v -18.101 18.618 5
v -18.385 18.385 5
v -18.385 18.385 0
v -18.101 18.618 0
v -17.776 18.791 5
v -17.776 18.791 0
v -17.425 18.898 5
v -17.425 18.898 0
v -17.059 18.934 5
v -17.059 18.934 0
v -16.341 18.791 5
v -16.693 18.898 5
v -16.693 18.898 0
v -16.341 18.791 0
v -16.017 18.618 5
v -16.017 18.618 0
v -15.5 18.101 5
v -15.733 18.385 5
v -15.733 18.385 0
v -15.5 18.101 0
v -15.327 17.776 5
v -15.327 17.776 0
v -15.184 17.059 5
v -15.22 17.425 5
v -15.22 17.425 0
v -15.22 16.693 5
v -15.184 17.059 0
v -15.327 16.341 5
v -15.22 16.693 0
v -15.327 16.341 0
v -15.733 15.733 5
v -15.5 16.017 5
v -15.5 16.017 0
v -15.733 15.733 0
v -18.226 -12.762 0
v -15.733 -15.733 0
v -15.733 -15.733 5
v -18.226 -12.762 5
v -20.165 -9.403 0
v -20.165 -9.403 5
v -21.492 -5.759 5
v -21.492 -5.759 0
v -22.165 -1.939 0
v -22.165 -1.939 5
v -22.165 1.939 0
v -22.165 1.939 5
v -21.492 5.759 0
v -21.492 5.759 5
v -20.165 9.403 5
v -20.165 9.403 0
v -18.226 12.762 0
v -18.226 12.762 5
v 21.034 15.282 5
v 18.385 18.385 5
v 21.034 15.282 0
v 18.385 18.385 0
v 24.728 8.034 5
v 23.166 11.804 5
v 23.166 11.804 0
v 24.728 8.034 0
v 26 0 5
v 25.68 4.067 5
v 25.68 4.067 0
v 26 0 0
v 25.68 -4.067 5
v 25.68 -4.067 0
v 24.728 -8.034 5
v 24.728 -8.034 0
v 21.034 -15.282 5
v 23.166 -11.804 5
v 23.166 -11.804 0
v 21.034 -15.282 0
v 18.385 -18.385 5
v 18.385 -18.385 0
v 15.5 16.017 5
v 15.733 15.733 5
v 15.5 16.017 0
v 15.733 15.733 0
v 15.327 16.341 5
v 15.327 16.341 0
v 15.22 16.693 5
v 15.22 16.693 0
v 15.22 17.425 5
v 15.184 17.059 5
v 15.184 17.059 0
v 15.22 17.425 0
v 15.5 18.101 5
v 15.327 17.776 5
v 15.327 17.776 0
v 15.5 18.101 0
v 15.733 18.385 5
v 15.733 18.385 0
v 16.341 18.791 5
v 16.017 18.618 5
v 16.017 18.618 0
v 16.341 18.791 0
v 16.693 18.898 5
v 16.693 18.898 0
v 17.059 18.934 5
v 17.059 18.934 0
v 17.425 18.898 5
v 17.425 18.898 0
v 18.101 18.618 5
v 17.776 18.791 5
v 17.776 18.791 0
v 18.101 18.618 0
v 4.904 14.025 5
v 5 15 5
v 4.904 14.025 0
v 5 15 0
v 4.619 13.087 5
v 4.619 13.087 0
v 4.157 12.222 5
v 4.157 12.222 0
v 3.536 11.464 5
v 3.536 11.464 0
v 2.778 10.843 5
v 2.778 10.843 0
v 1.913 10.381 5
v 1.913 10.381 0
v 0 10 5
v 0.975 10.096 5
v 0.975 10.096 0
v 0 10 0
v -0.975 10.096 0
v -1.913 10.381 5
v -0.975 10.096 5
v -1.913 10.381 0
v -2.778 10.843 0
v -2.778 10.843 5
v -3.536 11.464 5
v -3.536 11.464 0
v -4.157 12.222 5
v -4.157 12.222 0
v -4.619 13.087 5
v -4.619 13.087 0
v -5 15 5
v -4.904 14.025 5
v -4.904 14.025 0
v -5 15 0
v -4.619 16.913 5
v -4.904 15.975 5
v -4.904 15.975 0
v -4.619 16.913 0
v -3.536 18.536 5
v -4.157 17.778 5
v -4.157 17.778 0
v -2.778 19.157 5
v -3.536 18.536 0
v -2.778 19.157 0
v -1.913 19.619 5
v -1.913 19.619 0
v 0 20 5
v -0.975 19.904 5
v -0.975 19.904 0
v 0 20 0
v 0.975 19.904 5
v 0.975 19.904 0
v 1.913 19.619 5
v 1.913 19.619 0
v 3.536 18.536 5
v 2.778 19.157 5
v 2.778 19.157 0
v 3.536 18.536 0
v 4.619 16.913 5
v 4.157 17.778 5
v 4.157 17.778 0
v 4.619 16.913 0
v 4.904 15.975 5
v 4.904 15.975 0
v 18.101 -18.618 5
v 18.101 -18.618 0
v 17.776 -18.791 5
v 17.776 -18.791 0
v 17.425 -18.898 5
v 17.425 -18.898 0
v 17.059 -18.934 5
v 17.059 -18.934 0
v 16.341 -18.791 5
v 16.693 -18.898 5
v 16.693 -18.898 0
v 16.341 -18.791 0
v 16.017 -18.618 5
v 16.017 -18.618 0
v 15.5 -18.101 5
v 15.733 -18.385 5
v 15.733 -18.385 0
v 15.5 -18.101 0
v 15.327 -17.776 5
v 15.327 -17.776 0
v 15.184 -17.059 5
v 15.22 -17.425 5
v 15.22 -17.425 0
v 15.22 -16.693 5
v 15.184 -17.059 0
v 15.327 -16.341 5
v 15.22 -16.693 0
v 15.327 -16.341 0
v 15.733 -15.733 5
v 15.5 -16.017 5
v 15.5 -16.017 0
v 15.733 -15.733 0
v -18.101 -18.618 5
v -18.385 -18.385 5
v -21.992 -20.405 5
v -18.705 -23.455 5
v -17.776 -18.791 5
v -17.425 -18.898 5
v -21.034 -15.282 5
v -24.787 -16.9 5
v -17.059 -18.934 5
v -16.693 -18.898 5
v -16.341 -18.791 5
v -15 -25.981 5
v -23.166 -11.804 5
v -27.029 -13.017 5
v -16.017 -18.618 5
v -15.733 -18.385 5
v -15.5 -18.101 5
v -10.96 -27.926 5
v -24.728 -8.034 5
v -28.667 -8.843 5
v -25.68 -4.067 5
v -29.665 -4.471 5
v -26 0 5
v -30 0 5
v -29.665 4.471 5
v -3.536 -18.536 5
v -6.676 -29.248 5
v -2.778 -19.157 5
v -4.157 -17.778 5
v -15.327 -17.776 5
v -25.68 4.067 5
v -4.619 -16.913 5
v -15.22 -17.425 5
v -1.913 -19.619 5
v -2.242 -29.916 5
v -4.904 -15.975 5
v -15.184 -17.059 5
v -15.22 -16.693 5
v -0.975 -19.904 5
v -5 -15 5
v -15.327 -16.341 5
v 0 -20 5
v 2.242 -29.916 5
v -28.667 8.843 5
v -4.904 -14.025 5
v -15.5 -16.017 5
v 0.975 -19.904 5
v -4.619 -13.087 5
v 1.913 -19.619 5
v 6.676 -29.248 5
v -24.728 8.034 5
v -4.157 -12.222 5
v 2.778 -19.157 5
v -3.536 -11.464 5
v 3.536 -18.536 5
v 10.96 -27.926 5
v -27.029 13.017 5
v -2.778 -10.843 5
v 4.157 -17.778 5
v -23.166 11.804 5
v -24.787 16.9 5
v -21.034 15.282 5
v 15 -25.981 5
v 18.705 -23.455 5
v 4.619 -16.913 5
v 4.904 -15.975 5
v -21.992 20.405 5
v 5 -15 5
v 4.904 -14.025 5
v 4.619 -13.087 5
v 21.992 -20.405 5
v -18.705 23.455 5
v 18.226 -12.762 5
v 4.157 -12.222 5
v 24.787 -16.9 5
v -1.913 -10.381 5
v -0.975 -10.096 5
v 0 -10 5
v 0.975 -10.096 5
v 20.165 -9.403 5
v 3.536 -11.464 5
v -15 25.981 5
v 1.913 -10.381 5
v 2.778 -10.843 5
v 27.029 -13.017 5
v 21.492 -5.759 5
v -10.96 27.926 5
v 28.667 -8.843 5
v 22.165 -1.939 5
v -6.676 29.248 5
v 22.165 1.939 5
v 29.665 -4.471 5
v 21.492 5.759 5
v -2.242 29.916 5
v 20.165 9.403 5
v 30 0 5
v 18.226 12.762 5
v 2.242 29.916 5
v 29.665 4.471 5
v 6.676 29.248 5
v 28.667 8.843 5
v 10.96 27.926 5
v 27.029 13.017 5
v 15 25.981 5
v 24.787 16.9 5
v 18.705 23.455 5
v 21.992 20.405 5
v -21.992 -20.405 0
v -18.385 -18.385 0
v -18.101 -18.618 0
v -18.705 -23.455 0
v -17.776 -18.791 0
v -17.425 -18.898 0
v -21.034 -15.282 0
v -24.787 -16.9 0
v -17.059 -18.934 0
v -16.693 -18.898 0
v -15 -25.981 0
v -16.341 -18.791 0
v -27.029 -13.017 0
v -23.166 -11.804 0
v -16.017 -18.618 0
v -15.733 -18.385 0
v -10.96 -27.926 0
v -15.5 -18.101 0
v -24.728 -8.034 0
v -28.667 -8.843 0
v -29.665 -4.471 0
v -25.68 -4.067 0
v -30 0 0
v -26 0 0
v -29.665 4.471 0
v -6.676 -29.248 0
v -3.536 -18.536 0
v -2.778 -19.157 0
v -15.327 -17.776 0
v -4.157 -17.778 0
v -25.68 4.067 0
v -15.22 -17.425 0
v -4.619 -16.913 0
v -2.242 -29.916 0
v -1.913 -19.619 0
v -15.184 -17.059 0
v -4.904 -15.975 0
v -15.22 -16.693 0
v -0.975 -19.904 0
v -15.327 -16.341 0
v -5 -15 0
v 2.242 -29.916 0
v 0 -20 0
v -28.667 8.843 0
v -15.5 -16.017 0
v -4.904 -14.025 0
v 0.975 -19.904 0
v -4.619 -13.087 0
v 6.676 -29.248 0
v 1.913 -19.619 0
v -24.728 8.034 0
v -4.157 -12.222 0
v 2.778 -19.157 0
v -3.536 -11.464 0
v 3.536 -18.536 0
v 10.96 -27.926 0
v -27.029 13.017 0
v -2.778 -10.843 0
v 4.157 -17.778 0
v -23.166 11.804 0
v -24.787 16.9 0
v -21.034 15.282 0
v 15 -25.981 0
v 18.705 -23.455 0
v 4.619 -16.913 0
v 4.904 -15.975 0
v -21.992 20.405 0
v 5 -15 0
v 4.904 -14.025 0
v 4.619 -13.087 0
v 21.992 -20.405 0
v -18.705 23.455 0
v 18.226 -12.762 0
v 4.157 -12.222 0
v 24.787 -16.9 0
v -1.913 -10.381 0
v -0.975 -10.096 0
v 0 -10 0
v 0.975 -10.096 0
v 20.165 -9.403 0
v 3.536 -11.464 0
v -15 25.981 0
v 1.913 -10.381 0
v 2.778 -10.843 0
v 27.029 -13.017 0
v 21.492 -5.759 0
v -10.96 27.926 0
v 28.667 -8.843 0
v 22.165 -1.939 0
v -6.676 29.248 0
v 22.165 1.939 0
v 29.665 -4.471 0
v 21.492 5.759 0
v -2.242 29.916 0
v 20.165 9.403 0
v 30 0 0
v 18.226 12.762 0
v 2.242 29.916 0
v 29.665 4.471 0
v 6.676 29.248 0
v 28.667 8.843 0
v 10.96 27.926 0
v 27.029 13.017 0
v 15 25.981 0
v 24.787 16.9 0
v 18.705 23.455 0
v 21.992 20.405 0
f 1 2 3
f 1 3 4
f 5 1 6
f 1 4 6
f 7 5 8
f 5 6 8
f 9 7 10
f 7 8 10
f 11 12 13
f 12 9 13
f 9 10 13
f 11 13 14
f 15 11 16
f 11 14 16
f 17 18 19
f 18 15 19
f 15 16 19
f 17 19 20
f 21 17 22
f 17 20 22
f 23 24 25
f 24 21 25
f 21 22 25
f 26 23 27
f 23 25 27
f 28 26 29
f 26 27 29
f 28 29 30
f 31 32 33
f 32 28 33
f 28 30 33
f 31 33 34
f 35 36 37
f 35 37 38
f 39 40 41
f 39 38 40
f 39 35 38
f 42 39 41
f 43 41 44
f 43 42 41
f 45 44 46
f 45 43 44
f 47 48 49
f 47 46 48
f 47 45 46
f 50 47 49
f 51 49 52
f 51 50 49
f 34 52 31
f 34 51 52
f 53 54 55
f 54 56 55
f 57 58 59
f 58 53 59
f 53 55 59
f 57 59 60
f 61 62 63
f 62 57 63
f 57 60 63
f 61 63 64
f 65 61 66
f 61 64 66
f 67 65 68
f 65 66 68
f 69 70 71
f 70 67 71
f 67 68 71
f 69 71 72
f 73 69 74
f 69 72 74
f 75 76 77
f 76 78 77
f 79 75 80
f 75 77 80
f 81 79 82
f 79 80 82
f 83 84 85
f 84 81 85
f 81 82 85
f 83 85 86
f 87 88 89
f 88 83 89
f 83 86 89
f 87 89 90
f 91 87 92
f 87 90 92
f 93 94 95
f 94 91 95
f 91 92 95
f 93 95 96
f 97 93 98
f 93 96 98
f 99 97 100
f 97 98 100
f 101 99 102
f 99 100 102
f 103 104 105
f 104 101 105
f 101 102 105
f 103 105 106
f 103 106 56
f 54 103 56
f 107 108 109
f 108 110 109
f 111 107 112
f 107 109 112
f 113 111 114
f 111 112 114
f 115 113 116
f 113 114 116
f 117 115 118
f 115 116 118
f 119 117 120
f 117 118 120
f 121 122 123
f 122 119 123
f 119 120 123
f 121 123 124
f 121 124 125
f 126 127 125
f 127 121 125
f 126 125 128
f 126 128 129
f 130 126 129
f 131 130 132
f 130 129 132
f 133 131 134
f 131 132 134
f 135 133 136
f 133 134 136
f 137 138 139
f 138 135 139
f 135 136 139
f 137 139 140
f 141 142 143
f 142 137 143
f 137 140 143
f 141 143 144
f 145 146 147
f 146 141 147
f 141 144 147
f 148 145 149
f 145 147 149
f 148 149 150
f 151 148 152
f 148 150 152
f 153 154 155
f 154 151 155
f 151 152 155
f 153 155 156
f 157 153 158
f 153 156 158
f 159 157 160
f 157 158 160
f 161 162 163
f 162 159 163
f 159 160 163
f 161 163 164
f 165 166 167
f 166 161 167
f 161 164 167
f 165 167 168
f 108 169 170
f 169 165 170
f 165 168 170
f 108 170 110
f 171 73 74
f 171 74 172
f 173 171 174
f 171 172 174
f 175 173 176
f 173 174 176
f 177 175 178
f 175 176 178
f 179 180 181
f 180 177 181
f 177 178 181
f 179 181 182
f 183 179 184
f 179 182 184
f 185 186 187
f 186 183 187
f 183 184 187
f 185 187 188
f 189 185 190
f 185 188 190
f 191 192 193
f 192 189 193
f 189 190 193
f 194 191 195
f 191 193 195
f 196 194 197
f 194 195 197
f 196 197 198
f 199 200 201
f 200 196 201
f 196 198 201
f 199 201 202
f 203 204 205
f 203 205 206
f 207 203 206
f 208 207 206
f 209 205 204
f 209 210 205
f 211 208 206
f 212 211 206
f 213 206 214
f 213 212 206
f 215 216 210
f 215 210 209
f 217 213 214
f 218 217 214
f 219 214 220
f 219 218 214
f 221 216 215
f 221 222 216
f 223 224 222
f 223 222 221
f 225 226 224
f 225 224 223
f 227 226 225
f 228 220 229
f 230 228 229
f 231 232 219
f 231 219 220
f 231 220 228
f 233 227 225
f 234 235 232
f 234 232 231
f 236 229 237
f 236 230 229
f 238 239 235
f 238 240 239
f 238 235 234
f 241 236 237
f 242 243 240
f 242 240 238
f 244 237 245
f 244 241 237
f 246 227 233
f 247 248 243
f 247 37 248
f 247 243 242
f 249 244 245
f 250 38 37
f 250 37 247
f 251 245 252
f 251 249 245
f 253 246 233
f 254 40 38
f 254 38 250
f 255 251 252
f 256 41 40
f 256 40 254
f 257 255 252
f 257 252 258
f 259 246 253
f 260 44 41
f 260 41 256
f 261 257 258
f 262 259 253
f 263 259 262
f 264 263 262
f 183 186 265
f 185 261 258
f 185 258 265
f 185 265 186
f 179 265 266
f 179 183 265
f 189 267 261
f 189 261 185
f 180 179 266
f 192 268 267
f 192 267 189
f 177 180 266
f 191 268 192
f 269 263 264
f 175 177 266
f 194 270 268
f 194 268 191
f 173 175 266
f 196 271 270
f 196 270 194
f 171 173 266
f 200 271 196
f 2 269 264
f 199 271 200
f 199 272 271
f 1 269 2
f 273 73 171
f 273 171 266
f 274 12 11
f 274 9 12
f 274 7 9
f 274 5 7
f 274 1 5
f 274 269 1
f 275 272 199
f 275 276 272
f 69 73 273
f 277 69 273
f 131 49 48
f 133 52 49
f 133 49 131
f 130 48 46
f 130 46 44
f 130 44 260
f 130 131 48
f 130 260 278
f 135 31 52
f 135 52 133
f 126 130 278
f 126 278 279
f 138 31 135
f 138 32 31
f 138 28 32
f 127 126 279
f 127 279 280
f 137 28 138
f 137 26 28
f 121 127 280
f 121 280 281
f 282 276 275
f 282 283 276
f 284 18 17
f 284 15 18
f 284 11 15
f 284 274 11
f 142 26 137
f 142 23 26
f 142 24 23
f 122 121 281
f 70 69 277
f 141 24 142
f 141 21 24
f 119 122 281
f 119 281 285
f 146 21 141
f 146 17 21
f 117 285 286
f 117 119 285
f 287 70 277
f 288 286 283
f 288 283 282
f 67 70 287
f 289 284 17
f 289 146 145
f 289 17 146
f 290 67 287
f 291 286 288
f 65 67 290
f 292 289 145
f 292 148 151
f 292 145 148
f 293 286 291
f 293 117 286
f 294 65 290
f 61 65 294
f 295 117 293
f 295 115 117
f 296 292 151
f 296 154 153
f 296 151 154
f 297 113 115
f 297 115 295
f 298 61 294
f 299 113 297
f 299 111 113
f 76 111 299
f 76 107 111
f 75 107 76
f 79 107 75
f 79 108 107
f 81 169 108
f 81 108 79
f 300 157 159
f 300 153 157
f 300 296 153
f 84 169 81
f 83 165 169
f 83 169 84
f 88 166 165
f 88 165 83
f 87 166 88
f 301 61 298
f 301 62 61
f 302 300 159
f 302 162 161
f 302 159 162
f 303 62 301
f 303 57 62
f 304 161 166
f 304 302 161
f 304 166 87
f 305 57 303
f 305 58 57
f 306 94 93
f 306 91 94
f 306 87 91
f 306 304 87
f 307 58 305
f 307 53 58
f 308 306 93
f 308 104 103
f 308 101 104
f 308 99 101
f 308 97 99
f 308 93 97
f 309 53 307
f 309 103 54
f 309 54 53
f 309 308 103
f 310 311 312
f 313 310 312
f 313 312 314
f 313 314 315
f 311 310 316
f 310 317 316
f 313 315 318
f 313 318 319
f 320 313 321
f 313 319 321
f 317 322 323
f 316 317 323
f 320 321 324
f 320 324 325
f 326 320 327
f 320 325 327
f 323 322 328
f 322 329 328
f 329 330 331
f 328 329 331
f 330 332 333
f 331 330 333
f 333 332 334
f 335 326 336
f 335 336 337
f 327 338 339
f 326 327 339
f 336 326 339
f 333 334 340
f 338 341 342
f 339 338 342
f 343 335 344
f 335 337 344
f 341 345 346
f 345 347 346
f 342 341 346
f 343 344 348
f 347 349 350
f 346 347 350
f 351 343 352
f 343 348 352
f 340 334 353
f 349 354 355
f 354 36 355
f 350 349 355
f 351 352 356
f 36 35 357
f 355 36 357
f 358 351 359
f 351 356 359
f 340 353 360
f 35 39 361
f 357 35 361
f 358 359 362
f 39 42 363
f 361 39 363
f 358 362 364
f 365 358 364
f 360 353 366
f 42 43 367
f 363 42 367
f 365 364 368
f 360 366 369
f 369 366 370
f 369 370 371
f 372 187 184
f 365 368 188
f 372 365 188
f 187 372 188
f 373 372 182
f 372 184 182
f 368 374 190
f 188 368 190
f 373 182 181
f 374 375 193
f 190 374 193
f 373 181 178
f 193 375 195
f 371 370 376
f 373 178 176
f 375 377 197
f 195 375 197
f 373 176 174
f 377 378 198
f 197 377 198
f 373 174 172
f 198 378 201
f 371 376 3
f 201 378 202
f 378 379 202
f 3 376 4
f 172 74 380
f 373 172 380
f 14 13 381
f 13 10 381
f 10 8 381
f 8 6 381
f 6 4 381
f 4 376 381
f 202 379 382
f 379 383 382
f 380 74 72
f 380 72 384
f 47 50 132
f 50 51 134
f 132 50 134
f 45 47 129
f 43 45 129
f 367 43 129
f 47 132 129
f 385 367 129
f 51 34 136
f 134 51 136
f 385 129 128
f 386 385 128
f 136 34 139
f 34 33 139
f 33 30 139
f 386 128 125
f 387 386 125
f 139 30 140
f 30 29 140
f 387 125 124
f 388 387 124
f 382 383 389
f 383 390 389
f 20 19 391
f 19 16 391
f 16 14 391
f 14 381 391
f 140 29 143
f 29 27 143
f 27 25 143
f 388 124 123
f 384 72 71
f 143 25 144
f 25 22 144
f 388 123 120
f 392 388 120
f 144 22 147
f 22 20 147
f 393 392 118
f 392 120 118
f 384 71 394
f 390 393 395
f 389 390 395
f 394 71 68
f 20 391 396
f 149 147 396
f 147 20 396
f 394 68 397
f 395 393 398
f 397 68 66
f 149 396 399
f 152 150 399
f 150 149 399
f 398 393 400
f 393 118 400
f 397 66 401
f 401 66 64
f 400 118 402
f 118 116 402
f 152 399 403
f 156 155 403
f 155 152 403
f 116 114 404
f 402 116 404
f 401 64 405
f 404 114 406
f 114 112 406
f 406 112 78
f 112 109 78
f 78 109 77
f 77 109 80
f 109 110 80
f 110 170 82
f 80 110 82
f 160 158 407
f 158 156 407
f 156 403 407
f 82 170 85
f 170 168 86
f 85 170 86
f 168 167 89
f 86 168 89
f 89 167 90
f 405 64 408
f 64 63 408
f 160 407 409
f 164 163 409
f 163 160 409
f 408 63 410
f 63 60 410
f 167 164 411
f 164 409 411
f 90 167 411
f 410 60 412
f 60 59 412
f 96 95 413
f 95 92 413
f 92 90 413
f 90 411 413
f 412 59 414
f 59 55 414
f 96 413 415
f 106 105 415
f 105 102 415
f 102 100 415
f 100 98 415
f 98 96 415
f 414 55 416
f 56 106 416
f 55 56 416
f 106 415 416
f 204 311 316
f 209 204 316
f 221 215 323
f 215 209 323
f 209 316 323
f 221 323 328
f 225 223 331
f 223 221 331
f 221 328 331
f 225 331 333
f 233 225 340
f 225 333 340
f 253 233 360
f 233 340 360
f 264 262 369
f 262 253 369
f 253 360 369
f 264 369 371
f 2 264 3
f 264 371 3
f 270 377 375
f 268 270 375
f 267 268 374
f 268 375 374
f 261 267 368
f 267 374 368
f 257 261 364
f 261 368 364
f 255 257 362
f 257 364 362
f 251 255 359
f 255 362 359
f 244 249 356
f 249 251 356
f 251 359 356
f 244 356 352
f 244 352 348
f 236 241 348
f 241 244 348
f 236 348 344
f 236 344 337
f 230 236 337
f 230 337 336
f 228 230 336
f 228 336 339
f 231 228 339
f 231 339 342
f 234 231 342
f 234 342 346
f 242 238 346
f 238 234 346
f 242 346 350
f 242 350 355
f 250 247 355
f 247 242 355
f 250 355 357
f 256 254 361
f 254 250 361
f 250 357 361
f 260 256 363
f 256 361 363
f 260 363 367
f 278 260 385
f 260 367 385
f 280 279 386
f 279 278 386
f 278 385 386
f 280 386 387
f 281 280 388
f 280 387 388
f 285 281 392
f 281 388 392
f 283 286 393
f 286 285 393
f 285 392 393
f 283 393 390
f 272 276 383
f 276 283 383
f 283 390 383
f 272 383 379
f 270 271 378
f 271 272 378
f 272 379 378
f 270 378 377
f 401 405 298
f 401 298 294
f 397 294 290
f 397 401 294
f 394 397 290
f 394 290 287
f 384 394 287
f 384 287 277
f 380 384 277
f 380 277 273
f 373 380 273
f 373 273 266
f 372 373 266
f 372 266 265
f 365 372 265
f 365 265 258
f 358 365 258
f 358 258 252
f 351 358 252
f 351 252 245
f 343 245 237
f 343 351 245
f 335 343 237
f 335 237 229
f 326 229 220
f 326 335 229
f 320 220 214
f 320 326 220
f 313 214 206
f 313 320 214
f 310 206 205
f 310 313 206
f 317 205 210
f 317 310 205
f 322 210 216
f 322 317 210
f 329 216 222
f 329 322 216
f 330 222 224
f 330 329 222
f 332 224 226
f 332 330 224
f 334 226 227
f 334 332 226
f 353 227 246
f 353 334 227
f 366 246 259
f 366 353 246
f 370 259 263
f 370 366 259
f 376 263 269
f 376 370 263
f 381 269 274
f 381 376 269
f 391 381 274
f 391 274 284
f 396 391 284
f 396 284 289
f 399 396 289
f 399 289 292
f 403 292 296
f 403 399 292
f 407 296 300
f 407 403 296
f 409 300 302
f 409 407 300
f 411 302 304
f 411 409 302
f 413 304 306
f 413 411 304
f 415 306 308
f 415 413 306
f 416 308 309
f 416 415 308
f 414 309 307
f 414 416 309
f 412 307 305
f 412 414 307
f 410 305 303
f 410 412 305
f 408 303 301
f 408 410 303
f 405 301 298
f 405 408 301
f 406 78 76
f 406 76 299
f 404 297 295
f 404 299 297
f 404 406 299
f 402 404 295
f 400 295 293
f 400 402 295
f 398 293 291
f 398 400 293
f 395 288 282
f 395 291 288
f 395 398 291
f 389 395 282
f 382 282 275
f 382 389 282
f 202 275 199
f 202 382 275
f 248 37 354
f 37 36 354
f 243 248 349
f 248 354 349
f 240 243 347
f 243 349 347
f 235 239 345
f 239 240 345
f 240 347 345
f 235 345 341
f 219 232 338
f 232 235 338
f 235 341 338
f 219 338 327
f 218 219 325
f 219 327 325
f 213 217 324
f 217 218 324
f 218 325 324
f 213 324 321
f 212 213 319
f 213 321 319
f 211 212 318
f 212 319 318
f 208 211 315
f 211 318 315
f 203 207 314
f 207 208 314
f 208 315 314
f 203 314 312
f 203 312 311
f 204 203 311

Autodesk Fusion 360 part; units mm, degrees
sketch "Sketch1" plane through (0, 0, 0) normal (0, 0, 1) x (1, 0, 0)
  circle A0 centre (0, -15) radius 5
  circle A1 centre (0, 15) radius 5
  line L0 (26.5, 0) -> (27.807, 0) construction
  circle A2 centre (0, 0) radius 30
  line L1 (22.25, 0) -> (27.7377, 0) construction
  arc A3 (18.3848, 18.3848) -> (15.7331, 15.7331) centre (17.059, 17.059) ccw
  arc A4 (-15.7331, 15.7331) -> (-18.3848, 18.3848) centre (-17.059, 17.059) ccw
  arc A5 (15.7331, -15.7331) -> (18.3848, -18.3848) centre (17.059, -17.059) ccw
  arc A6 (-18.3848, -18.3848) -> (-15.7331, -15.7331) centre (-17.059, -17.059) ccw
  arc A7 (-15.7331, 15.7331) -> (-15.7331, -15.7331) centre (0, 0) ccw
  arc A8 (15.7331, -15.7331) -> (15.7331, 15.7331) centre (0, 0) ccw
  arc A9 (-18.3848, 18.3848) -> (-18.3848, -18.3848) centre (0, 0) ccw
  arc A10 (18.3848, -18.3848) -> (18.3848, 18.3848) centre (0, 0) ccw
  dimension "d4" = 15
  dimension "d5" = 10
  dimension "d11" = 60
  dimension "d12" = 52
  dimension "d16" = 44.5
  dimension "d17" = 3.75
extrude "Extrude1" add sketch "Sketch1" along normal blind 5
